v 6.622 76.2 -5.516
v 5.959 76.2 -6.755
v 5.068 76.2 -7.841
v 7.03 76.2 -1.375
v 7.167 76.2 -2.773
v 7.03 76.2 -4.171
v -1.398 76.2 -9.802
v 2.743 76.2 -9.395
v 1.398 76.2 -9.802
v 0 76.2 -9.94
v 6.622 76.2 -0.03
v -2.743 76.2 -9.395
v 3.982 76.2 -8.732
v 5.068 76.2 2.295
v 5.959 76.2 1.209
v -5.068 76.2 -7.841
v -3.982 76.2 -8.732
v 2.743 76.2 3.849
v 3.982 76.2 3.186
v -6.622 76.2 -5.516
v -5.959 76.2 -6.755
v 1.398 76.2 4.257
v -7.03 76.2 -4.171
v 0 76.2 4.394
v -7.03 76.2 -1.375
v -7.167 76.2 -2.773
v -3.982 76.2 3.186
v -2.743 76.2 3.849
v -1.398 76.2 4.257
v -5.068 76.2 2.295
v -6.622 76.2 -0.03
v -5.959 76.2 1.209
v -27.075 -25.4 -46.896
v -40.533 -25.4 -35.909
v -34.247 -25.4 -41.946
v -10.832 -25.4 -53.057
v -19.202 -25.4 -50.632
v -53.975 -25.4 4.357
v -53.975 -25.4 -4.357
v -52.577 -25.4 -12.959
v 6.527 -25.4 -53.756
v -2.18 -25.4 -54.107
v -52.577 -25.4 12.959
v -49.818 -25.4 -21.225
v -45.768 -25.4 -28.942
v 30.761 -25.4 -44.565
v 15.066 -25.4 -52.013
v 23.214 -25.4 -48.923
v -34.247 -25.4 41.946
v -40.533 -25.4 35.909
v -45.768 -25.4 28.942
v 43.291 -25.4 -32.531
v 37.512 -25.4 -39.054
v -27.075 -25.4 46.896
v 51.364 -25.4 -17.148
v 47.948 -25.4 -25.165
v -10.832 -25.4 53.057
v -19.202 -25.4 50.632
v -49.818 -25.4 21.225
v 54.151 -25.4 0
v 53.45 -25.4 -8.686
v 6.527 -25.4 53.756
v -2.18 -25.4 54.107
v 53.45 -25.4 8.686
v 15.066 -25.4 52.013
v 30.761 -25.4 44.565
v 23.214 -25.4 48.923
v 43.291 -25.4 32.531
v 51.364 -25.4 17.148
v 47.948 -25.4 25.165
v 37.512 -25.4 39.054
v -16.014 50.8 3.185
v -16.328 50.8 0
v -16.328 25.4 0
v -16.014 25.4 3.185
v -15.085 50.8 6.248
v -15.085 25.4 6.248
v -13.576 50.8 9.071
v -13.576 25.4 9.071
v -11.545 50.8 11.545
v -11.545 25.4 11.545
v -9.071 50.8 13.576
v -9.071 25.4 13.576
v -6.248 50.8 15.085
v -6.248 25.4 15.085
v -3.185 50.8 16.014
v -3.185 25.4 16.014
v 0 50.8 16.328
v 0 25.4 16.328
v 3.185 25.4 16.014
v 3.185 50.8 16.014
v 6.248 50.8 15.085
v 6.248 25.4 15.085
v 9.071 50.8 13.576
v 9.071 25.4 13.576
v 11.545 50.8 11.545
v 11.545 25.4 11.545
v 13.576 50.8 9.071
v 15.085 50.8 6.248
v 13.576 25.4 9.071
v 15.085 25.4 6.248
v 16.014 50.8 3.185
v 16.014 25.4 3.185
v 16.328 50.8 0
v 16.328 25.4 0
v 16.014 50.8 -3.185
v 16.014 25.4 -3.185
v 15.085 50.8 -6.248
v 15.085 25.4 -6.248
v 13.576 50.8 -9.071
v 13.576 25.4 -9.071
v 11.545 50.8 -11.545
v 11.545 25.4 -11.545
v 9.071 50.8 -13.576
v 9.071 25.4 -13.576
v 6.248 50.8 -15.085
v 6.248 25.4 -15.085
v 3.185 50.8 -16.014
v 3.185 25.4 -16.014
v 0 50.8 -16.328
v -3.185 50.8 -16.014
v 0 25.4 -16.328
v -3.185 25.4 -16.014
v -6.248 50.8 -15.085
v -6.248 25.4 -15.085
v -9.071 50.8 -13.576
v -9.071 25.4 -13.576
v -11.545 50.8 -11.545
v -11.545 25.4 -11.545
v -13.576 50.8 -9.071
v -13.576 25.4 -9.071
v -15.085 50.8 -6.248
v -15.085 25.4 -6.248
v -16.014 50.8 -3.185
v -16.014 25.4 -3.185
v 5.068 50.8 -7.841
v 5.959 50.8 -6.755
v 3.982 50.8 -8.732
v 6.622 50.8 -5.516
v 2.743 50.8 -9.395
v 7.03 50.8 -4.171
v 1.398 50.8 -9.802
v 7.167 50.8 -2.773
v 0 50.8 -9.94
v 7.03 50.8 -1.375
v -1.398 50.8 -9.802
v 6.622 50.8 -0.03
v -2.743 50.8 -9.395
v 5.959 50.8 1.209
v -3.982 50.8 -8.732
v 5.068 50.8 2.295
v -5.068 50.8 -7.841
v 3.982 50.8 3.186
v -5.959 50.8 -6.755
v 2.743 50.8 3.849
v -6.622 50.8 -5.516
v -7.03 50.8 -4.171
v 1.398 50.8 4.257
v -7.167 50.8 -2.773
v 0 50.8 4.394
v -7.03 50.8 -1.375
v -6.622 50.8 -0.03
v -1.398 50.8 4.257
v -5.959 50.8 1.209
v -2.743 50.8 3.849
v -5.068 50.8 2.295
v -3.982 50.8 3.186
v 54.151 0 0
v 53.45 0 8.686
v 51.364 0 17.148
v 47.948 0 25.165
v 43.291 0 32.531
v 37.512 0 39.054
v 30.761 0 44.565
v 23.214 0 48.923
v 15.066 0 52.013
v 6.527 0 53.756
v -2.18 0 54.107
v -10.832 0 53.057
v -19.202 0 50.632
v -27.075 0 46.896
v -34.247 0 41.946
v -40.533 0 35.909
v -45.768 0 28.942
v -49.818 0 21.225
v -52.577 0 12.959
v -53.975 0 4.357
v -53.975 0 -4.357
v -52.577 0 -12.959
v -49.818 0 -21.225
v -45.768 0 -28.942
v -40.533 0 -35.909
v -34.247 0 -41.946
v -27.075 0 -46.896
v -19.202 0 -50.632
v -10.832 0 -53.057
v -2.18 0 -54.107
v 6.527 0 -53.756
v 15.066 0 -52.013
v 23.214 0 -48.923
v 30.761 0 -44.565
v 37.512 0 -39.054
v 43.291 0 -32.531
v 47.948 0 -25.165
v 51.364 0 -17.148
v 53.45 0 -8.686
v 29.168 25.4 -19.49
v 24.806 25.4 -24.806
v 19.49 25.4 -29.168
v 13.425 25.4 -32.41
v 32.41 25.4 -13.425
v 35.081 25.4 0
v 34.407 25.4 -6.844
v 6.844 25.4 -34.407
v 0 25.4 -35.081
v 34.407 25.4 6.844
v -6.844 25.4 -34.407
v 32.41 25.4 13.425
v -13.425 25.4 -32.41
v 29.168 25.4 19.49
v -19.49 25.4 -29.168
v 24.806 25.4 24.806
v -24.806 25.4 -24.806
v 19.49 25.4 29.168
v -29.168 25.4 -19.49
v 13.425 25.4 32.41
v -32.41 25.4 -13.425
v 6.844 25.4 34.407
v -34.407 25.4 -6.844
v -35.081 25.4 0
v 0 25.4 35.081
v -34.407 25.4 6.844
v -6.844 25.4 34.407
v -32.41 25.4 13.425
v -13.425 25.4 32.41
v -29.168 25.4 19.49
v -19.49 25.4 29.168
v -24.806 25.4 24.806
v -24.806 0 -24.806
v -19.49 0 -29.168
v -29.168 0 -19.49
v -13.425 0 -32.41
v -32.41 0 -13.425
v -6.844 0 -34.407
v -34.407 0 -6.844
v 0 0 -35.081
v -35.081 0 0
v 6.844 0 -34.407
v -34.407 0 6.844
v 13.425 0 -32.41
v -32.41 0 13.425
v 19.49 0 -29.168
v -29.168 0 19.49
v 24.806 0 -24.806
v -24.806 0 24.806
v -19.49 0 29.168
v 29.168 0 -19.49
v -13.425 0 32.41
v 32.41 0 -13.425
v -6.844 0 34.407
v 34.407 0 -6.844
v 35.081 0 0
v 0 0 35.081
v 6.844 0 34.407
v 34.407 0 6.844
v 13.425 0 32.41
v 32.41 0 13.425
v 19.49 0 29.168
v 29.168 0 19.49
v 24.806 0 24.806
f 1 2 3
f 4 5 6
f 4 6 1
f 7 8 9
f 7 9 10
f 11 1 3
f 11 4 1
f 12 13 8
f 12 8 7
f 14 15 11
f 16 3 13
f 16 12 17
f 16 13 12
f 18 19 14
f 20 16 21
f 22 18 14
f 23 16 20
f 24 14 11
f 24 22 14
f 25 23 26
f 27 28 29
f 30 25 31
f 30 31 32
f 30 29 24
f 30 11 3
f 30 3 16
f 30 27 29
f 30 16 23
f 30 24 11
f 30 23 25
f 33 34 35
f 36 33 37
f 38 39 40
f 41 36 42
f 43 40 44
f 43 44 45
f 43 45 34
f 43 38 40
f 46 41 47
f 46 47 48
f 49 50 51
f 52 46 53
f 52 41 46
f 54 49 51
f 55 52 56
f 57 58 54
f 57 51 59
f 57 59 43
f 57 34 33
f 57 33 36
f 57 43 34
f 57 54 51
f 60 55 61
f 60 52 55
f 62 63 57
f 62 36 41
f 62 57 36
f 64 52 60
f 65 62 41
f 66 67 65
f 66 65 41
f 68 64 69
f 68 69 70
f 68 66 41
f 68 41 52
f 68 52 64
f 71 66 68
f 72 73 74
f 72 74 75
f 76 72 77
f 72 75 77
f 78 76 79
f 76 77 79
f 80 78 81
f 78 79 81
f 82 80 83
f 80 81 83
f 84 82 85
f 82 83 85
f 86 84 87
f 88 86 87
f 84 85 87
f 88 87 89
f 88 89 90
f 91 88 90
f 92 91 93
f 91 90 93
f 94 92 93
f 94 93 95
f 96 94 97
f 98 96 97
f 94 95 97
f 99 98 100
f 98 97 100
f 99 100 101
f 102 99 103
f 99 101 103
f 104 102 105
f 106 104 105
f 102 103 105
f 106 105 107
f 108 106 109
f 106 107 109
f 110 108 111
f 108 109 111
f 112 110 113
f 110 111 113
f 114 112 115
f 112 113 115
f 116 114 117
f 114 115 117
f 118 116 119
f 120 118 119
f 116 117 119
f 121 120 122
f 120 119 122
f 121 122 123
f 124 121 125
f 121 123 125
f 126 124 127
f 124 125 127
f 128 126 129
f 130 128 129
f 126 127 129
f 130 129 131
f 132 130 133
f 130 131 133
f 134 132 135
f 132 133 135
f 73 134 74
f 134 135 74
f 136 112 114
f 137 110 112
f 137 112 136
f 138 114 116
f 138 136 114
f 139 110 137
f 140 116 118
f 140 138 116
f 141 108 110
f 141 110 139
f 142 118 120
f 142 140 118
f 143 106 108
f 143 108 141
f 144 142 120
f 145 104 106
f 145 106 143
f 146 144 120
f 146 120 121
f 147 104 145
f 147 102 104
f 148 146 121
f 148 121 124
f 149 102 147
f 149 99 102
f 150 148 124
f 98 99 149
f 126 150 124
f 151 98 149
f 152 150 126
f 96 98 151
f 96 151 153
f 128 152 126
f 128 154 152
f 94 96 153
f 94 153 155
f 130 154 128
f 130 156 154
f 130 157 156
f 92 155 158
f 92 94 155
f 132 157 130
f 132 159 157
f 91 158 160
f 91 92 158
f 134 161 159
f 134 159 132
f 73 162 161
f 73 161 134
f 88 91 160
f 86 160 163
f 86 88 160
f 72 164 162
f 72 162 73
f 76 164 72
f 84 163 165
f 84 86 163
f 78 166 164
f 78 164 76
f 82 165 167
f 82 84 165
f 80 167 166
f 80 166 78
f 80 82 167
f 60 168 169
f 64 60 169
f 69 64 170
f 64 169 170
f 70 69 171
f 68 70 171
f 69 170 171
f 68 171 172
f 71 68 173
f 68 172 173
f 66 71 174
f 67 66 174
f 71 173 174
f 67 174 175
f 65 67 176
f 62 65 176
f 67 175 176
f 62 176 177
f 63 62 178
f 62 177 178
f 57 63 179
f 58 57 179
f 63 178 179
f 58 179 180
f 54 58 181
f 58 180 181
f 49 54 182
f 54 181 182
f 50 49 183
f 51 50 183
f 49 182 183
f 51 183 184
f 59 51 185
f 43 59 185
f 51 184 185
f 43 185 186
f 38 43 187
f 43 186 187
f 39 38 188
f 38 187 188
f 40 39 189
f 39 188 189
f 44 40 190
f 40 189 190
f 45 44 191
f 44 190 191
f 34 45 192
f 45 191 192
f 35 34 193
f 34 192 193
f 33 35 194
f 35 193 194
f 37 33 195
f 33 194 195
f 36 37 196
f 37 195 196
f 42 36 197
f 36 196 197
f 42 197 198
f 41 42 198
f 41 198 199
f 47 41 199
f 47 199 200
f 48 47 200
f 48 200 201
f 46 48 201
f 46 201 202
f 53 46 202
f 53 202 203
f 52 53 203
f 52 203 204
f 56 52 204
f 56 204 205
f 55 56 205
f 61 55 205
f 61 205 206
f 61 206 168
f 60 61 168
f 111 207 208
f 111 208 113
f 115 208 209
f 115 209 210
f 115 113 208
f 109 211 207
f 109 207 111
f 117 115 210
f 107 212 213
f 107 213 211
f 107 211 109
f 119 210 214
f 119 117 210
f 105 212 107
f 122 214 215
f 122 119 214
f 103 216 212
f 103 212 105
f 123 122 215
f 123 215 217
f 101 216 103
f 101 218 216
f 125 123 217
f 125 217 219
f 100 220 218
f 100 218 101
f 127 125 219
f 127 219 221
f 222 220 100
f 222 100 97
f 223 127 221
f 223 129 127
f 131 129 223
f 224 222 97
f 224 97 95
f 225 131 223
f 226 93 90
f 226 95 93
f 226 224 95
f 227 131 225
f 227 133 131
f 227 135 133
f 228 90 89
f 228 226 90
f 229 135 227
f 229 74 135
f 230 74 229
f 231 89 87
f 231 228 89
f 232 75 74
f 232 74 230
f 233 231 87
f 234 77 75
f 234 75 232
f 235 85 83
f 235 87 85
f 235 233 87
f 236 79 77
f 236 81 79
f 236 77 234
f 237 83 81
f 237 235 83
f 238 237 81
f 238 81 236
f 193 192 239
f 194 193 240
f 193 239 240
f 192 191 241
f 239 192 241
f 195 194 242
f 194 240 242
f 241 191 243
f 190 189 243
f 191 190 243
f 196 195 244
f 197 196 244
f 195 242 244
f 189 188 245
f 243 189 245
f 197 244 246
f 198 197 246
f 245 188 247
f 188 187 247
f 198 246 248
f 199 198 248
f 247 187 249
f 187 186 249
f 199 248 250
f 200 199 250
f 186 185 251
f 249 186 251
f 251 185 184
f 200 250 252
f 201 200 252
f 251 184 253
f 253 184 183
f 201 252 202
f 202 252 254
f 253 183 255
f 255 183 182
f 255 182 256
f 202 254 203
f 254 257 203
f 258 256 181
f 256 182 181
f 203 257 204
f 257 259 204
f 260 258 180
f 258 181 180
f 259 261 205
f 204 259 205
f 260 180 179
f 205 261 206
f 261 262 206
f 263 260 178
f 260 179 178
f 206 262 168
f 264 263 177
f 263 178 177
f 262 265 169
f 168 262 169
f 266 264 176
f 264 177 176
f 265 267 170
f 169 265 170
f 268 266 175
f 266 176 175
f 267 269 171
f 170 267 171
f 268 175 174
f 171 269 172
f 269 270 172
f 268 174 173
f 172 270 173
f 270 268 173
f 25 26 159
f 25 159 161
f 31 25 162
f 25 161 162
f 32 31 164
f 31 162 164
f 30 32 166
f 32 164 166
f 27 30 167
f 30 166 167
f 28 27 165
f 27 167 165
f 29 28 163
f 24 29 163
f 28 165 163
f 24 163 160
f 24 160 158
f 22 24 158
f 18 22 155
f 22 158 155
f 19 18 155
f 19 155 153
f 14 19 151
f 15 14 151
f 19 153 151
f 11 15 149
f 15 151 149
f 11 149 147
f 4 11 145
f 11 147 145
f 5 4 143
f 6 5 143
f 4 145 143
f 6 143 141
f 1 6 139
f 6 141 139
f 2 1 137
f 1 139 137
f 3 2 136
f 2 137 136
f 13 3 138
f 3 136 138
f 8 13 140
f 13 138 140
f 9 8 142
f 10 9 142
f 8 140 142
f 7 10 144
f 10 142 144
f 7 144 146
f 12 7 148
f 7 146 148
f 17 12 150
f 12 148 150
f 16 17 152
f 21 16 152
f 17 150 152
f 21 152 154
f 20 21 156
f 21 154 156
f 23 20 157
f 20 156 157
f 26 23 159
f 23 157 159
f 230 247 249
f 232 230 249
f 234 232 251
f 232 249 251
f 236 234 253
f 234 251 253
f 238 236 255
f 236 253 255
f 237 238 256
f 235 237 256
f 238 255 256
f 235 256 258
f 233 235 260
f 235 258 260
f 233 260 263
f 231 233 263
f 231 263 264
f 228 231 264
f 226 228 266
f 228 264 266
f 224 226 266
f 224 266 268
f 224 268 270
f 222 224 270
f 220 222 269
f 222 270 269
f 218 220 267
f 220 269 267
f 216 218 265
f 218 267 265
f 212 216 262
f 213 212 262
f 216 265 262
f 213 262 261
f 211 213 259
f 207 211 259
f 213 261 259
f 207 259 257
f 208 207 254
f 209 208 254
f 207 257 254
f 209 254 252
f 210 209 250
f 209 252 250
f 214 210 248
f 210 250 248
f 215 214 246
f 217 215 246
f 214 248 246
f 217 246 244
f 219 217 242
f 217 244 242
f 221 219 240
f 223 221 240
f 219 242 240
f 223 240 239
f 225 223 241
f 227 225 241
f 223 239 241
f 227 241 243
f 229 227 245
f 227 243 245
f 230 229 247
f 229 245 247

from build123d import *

# Parameters (mm, degrees)
F0_R     = 54.15088
F1_DEPTH = 25.4
F2_R     = 35.080645
F3_DEPTH = 25.4
F4_R     = 16.327777
F5_DEPTH = 25.4
F6_R     = 7.16725
F7_DEPTH = 25.4


with BuildPart() as f1:
    # F0 (on Front) → F1 (new body)
    with BuildSketch(Plane.XZ):
        Circle(F0_R)
    extrude(amount=F1_DEPTH)

    # F2 (on face) → F3 (join)
    with BuildSketch(Plane(origin=(0, 0, 0), x_dir=(-1, 0, 0), z_dir=(0, 1, 0))):
        Circle(F2_R)
    extrude(amount=F3_DEPTH)

    # F4 (on face) → F5 (join)
    with BuildSketch(Plane(origin=(0, 25.4, 0), x_dir=(-1, 0, 0), z_dir=(0, 1, 0))):
        Circle(F4_R)
    extrude(amount=F5_DEPTH)

    # F6 (on face) → F7 (join)
    with BuildSketch(Plane(origin=(0, 50.8, 0), x_dir=(-1, 0, 0), z_dir=(0, 1, 0))):
        with Locations((0, -2.772863)):
            Circle(F6_R)
    extrude(amount=F7_DEPTH)


solid = f1.part
